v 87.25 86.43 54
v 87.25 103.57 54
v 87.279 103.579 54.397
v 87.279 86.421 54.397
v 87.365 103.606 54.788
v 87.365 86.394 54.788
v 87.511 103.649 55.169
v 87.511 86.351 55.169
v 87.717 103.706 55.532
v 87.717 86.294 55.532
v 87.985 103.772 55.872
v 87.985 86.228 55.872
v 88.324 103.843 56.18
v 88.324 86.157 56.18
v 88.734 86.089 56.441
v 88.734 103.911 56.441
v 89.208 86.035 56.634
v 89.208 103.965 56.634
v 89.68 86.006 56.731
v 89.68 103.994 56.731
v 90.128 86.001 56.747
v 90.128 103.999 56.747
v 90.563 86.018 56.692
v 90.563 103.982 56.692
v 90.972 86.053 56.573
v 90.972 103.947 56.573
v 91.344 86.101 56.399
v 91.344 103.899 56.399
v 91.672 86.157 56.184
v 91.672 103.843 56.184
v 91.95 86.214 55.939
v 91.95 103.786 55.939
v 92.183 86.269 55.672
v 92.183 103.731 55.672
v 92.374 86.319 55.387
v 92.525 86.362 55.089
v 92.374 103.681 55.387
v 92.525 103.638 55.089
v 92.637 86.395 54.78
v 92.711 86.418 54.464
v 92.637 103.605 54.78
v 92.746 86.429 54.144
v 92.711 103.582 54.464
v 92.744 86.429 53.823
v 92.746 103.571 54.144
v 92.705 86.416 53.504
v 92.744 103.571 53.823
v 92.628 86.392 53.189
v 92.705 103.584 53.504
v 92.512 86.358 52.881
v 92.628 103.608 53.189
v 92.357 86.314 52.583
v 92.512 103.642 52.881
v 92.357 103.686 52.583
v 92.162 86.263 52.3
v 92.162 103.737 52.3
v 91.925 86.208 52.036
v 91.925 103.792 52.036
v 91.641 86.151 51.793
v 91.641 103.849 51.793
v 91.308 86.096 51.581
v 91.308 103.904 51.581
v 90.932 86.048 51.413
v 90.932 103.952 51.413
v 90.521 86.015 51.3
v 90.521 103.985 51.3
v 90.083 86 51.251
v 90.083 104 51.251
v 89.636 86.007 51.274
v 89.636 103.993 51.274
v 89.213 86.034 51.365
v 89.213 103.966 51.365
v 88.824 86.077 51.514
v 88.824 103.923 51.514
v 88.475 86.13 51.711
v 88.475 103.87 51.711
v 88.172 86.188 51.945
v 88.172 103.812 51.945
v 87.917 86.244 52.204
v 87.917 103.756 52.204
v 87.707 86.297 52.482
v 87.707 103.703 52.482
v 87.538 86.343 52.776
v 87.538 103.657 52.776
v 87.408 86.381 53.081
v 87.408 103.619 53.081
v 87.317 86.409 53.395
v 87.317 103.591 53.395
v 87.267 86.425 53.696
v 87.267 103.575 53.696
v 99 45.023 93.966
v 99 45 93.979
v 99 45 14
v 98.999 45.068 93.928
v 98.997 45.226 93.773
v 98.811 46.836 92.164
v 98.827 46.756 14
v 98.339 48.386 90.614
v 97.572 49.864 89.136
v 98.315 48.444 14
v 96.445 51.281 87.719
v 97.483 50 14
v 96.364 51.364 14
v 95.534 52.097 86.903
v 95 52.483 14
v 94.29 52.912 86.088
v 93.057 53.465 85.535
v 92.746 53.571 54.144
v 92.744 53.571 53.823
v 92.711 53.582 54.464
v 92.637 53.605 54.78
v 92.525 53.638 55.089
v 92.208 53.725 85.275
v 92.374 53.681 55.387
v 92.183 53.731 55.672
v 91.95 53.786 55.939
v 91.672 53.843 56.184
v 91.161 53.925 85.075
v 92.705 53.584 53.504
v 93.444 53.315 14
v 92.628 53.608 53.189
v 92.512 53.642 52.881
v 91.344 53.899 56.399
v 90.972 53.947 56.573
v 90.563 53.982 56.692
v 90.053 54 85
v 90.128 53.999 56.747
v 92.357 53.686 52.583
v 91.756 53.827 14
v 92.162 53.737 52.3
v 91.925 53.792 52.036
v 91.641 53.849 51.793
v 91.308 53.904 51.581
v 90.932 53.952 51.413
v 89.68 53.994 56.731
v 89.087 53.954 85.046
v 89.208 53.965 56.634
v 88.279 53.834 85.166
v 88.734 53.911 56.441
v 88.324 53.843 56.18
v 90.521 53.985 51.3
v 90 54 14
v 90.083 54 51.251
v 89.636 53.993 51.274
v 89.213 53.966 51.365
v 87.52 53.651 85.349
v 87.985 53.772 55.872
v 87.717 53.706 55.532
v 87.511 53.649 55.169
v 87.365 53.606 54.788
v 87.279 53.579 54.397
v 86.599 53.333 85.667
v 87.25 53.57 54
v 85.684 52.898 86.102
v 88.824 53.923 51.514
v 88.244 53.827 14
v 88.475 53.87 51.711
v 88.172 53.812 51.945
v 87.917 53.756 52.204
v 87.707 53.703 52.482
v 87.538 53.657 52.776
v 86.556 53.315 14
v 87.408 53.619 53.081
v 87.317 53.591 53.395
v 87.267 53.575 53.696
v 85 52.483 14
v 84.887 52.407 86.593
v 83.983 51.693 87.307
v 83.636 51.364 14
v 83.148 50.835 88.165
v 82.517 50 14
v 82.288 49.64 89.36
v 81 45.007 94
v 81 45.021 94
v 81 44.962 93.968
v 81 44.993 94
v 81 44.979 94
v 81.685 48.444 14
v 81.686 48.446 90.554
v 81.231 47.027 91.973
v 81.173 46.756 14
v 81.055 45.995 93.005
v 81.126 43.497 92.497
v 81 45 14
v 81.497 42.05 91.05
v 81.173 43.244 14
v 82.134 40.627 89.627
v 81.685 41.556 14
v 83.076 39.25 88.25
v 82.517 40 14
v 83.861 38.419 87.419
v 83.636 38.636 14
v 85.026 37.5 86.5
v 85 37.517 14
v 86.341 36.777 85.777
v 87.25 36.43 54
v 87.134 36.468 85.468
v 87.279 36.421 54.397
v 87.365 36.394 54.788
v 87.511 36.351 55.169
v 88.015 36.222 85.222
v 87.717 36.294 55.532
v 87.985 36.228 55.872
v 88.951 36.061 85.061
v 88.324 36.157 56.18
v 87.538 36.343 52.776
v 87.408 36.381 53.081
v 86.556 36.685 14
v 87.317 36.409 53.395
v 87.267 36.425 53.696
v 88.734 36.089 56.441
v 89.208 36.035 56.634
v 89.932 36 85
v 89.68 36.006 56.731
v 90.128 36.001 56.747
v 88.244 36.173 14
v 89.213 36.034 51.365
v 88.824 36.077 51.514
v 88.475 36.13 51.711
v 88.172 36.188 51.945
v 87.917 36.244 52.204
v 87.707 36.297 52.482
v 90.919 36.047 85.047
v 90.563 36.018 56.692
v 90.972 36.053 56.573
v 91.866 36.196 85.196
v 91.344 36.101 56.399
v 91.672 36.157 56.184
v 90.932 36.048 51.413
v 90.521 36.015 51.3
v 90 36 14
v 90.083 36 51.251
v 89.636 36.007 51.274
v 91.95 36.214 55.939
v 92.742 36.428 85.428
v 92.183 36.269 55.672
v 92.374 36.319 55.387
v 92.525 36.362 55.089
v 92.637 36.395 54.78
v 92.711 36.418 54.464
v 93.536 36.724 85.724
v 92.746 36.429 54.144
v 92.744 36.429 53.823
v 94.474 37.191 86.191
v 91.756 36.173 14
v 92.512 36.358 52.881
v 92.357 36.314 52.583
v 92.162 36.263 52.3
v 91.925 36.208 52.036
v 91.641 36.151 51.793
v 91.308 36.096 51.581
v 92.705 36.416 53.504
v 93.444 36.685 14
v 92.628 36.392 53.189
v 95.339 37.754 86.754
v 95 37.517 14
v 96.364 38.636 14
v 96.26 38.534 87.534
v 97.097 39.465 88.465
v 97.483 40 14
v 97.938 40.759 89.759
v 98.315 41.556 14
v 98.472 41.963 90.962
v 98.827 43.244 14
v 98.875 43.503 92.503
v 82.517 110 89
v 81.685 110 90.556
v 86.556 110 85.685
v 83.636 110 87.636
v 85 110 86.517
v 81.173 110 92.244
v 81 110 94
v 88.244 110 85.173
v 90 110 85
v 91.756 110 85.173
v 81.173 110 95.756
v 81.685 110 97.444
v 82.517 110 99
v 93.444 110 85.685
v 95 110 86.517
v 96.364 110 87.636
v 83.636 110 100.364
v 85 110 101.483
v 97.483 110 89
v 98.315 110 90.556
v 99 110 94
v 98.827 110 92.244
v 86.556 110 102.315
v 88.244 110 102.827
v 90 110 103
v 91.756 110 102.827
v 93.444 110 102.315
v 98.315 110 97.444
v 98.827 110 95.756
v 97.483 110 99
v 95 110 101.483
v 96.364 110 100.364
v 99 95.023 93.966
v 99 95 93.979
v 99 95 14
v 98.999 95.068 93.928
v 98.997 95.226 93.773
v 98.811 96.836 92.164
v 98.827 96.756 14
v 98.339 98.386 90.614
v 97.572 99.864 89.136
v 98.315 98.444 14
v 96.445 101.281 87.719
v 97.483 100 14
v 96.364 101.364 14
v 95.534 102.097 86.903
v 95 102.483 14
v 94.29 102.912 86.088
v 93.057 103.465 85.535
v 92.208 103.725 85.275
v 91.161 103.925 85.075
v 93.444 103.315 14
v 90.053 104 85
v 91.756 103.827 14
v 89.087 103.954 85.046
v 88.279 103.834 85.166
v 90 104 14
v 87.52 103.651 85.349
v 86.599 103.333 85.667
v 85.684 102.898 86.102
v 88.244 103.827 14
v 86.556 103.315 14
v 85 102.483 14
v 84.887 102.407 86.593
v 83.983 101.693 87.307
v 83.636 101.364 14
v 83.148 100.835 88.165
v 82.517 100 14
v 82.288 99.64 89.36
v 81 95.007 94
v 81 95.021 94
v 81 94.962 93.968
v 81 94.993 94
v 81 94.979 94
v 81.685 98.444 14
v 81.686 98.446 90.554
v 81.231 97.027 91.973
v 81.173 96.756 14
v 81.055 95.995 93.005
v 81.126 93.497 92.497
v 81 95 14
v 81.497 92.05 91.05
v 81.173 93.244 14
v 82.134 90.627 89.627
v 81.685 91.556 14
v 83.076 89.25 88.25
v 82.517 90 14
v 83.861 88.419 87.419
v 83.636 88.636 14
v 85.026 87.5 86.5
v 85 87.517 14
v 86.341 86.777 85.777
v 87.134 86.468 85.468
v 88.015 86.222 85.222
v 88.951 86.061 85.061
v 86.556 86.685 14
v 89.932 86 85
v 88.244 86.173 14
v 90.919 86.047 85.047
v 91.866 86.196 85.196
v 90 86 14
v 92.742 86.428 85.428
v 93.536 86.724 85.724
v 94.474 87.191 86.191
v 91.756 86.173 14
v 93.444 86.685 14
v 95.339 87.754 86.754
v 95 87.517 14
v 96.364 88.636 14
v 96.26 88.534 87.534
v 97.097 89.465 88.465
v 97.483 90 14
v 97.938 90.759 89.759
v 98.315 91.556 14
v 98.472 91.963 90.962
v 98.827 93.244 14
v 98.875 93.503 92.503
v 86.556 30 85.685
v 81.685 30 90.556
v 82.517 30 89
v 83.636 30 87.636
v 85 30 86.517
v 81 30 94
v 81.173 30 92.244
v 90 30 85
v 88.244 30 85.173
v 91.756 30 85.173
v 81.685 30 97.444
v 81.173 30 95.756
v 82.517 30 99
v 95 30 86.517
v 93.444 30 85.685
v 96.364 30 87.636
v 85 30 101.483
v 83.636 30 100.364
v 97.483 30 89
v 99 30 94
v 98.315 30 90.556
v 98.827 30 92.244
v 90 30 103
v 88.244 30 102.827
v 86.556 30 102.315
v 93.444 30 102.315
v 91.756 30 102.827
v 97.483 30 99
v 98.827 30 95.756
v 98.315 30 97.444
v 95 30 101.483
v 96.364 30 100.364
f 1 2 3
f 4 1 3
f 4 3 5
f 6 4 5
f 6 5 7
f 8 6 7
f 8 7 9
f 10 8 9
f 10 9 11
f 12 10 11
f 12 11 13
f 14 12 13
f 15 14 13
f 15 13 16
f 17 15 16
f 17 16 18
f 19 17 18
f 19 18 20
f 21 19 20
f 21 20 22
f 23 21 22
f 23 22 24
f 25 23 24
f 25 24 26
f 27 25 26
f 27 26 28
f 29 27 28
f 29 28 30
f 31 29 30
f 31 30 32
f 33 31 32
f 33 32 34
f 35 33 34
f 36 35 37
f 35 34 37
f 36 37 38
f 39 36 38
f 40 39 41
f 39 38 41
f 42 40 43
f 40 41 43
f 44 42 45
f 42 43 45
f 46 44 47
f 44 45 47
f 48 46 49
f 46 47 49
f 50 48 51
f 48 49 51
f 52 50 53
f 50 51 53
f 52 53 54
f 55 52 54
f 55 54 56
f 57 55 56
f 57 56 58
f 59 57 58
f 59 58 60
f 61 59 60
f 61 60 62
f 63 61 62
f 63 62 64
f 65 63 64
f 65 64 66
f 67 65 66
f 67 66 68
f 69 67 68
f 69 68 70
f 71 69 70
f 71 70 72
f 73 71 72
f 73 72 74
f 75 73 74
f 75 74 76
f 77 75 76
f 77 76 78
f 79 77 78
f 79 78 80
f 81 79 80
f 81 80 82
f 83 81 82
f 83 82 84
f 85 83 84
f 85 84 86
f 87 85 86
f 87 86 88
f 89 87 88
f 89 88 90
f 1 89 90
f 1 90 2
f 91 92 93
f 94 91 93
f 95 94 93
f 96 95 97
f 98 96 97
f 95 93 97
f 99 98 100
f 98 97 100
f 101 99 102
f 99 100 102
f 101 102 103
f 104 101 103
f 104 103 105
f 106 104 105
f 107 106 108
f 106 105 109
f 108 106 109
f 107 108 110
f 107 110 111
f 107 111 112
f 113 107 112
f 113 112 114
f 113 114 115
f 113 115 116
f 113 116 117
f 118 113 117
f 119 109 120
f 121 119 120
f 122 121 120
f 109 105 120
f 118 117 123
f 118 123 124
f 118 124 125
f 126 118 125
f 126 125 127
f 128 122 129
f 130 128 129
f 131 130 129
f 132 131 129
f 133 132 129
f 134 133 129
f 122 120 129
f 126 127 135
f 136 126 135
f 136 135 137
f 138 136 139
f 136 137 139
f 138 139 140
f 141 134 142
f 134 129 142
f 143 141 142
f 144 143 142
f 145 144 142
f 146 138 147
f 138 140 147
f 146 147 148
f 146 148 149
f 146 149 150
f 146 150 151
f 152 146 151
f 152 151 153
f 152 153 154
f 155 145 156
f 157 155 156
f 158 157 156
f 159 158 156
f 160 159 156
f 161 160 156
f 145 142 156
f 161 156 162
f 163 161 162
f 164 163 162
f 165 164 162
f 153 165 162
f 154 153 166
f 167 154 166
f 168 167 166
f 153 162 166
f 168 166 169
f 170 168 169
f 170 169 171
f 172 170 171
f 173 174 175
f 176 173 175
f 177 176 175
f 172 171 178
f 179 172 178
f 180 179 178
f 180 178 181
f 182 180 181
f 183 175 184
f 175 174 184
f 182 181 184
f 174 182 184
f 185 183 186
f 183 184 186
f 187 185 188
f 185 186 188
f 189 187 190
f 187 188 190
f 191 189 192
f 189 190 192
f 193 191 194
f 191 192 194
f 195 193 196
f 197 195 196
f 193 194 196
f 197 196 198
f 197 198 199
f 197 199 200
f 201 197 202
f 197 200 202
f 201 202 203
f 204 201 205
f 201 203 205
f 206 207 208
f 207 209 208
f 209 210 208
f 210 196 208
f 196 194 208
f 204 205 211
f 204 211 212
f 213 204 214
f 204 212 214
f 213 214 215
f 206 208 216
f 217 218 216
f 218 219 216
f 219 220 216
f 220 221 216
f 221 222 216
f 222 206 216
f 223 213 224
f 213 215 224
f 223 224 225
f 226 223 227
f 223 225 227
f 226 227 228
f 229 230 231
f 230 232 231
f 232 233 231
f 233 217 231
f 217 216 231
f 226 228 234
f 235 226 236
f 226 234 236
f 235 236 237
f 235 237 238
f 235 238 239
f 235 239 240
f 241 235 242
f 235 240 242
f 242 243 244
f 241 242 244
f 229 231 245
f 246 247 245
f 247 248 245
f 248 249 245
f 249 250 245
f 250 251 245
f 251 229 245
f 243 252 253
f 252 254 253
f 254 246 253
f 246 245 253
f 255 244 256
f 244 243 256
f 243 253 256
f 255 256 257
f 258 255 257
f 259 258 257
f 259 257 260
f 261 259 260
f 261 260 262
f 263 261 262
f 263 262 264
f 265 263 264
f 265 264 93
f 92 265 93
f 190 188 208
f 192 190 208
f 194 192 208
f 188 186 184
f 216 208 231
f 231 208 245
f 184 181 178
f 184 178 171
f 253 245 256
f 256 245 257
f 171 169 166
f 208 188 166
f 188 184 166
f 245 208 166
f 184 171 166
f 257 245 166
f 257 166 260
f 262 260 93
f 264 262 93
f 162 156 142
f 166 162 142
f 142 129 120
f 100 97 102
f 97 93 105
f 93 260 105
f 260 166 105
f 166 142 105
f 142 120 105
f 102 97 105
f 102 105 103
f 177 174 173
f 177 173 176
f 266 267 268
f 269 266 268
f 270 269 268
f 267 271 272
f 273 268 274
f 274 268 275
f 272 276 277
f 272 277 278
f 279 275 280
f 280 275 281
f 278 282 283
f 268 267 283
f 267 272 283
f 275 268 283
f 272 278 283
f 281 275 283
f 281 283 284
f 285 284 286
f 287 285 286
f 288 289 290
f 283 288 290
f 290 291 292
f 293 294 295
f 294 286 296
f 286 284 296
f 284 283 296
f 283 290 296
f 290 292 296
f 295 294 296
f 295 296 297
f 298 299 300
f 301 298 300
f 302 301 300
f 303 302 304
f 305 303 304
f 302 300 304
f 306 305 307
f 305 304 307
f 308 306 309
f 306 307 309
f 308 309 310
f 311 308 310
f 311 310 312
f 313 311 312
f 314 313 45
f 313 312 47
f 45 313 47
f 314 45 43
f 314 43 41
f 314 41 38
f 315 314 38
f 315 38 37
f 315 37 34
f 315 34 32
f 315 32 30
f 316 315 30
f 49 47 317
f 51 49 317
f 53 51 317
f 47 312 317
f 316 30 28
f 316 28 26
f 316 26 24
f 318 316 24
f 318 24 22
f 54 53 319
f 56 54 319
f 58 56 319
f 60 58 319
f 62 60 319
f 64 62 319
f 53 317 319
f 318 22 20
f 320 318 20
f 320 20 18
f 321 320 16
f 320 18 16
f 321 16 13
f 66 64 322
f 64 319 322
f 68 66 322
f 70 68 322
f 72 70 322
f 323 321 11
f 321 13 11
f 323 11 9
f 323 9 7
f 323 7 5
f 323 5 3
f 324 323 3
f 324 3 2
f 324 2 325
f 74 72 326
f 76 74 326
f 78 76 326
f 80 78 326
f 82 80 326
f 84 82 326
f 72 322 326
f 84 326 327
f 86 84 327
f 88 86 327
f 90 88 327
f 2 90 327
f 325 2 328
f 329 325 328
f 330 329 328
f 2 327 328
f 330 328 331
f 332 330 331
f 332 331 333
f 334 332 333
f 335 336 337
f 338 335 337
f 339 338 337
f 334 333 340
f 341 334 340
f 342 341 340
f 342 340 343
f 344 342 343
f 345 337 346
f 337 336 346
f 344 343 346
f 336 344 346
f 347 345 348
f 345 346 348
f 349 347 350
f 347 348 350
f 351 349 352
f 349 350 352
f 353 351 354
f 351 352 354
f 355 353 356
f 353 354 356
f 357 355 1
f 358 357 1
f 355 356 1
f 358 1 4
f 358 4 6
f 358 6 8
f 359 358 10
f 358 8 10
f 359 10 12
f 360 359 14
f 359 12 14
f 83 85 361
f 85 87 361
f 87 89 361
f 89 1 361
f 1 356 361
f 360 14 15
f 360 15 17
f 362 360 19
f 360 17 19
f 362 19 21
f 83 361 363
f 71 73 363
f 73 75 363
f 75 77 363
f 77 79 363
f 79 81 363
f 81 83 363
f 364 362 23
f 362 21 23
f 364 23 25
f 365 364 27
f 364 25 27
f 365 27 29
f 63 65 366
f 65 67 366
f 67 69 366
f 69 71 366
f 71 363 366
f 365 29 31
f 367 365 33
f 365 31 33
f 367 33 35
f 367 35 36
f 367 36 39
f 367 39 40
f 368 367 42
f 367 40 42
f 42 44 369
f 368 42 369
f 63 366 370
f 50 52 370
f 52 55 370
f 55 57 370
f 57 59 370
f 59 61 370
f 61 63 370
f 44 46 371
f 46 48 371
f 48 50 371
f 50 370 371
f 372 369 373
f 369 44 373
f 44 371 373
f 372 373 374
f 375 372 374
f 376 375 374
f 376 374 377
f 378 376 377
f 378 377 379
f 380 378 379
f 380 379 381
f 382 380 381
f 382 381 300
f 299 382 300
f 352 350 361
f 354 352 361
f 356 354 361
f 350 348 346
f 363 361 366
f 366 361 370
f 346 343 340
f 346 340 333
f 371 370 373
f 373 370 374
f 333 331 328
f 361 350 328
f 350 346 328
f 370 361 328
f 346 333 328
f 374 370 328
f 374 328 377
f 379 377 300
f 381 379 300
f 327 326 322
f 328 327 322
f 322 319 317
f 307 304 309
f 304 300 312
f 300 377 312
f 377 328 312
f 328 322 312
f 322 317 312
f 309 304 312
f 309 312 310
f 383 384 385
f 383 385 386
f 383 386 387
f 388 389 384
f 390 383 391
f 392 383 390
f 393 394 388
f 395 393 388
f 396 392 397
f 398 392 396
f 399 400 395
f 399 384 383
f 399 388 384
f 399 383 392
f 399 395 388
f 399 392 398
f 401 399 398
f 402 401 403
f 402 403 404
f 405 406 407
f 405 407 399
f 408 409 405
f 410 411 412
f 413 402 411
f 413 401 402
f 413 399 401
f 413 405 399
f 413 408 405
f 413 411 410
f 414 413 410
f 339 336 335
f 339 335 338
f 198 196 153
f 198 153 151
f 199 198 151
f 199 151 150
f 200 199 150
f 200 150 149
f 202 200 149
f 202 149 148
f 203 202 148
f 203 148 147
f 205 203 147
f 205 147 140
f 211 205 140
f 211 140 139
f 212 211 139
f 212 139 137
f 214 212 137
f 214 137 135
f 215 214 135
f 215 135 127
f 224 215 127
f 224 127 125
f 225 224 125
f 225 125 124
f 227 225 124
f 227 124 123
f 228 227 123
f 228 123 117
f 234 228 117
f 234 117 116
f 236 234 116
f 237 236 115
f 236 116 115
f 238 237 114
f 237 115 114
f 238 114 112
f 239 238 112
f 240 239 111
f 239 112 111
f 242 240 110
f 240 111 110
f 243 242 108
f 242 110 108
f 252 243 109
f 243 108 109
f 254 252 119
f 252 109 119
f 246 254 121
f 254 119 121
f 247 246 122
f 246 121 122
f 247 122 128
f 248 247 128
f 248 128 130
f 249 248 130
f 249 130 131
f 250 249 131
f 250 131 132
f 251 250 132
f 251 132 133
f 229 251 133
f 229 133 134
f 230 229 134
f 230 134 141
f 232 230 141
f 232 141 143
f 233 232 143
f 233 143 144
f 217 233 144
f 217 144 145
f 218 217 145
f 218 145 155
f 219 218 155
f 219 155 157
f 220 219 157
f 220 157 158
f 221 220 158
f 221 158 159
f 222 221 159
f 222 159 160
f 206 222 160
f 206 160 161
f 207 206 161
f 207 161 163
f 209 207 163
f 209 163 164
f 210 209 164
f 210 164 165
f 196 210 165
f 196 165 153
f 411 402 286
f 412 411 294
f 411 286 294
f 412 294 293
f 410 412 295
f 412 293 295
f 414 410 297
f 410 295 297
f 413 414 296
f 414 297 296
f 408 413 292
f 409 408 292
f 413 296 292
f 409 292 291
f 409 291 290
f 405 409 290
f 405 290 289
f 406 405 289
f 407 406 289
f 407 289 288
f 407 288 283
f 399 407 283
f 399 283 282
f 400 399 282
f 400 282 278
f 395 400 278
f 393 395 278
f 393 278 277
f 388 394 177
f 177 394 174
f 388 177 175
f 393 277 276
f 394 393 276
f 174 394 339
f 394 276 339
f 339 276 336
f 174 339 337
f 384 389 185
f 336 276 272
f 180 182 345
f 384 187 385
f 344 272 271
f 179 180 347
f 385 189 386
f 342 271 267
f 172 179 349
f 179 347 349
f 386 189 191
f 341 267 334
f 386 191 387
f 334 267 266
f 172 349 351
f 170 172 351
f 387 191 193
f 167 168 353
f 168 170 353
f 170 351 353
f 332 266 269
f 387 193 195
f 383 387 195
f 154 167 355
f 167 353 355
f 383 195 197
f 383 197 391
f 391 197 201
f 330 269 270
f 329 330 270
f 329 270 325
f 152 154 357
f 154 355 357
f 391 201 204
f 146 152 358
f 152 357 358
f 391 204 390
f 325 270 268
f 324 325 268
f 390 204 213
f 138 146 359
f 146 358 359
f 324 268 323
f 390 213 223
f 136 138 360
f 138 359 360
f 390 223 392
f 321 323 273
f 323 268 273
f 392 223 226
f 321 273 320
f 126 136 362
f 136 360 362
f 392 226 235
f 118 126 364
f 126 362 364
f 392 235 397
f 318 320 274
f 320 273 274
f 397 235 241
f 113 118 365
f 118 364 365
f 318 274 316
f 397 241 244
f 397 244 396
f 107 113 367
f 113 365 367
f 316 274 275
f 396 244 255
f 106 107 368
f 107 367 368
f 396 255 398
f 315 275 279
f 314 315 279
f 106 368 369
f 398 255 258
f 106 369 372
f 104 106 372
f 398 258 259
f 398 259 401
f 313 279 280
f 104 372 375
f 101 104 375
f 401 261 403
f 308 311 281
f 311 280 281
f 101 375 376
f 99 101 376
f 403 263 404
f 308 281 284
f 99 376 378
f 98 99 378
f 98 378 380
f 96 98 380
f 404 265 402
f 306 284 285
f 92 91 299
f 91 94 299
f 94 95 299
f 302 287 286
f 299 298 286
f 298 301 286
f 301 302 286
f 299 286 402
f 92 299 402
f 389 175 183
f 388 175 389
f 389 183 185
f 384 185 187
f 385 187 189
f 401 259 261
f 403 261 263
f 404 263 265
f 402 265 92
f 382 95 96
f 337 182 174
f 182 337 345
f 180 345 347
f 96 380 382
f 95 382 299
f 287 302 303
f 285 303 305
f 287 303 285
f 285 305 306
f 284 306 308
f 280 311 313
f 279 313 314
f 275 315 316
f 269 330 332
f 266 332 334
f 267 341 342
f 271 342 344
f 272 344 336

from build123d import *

# Parameters (mm, degrees)
SKETCH005_AS_DRAWN_R                                = 2.75
EXTRUDE_SKETCH005001_DEPTH                          = 90
EXTRUDE_SKETCH005001_ONTO_SKETCH005_ROLL_ANGLE      = 90
EXTRUDE_SKETCH005001_ONTO_SKETCH005_PLACEMENT_ANGLE = 180
CYLINDER_R                                          = 9
CYLINDER_DEPTH                                      = 80
CYLINDER001_R                                       = 9
CYLINDER001_DEPTH                                   = 80
CYLINDER001_ROLL_ANGLE                              = 90


with BuildPart() as clone_of_sketch005_extrude001:
    # Sketch005 as drawn → Extrude_Sketch005001 (new)
    with BuildSketch(Plane.XY):
        with Locations((-90, 54)):
            Circle(SKETCH005_AS_DRAWN_R)
    extrude(amount=-EXTRUDE_SKETCH005001_DEPTH)


with BuildPart() as clone_of_sketch005_extrude001_1:
    # Extrude_Sketch005001 onto Sketch005 roll: moved
    add(clone_of_sketch005_extrude001.part.rotate(Axis((0, 0, 0), (1, 0, 0)), EXTRUDE_SKETCH005001_ONTO_SKETCH005_ROLL_ANGLE))


with BuildPart() as clone_of_sketch005_extrude001_2:
    # Extrude_Sketch005001 onto Sketch005 placement: moved
    add(clone_of_sketch005_extrude001_1.part.moved(Location((0, 111, 0))).rotate(Axis((0, 111, 0), (0, 0, 1)), EXTRUDE_SKETCH005001_ONTO_SKETCH005_PLACEMENT_ANGLE))


with BuildPart() as cilindro:
    # Cylinder → Cylinder (new body)
    with BuildSketch(Plane(origin=(76.968275, 45, 32), x_dir=(1, 0, 0), z_dir=(0, 0, 1))):
        Circle(CYLINDER_R)
    extrude(amount=CYLINDER_DEPTH)


with BuildPart() as clone_of_cilindro:
    # Clone003 base: copy of Cilindro
    add(cilindro.part)


with BuildPart() as clone_of_cilindro_1:
    # Clone003 placement: moved
    add(clone_of_cilindro.part.moved(Location((0, 50, 0))))


with BuildPart() as cut003:
    # Cylinder001 → Cylinder001 (new body)
    with BuildSketch(Plane.XY):
        Circle(CYLINDER001_R)
    extrude(amount=CYLINDER001_DEPTH)


with BuildPart() as cut003_1:
    # Cylinder001 roll: moved
    add(cut003.part.rotate(Axis((0, 0, 0), (1, 0, 0)), CYLINDER001_ROLL_ANGLE))


with BuildPart() as cut003_2:
    # Cylinder001 placement: moved
    add(cut003_1.part.moved(Location((76.9683, 110, 112))))

    # Fusion: union Clone of Cilindro, Cilindro
    add(clone_of_cilindro_1.part)
    add(cilindro.part)


with BuildPart() as cut003_3:
    # Fusion placement: moved
    add(cut003_2.part.moved(Location((13.0317, 0, -18))))

    # Cut003: cut Clone of Sketch005_Extrude001
    add(clone_of_sketch005_extrude001_2.part, mode=Mode.SUBTRACT)


solid = cut003_3.part
